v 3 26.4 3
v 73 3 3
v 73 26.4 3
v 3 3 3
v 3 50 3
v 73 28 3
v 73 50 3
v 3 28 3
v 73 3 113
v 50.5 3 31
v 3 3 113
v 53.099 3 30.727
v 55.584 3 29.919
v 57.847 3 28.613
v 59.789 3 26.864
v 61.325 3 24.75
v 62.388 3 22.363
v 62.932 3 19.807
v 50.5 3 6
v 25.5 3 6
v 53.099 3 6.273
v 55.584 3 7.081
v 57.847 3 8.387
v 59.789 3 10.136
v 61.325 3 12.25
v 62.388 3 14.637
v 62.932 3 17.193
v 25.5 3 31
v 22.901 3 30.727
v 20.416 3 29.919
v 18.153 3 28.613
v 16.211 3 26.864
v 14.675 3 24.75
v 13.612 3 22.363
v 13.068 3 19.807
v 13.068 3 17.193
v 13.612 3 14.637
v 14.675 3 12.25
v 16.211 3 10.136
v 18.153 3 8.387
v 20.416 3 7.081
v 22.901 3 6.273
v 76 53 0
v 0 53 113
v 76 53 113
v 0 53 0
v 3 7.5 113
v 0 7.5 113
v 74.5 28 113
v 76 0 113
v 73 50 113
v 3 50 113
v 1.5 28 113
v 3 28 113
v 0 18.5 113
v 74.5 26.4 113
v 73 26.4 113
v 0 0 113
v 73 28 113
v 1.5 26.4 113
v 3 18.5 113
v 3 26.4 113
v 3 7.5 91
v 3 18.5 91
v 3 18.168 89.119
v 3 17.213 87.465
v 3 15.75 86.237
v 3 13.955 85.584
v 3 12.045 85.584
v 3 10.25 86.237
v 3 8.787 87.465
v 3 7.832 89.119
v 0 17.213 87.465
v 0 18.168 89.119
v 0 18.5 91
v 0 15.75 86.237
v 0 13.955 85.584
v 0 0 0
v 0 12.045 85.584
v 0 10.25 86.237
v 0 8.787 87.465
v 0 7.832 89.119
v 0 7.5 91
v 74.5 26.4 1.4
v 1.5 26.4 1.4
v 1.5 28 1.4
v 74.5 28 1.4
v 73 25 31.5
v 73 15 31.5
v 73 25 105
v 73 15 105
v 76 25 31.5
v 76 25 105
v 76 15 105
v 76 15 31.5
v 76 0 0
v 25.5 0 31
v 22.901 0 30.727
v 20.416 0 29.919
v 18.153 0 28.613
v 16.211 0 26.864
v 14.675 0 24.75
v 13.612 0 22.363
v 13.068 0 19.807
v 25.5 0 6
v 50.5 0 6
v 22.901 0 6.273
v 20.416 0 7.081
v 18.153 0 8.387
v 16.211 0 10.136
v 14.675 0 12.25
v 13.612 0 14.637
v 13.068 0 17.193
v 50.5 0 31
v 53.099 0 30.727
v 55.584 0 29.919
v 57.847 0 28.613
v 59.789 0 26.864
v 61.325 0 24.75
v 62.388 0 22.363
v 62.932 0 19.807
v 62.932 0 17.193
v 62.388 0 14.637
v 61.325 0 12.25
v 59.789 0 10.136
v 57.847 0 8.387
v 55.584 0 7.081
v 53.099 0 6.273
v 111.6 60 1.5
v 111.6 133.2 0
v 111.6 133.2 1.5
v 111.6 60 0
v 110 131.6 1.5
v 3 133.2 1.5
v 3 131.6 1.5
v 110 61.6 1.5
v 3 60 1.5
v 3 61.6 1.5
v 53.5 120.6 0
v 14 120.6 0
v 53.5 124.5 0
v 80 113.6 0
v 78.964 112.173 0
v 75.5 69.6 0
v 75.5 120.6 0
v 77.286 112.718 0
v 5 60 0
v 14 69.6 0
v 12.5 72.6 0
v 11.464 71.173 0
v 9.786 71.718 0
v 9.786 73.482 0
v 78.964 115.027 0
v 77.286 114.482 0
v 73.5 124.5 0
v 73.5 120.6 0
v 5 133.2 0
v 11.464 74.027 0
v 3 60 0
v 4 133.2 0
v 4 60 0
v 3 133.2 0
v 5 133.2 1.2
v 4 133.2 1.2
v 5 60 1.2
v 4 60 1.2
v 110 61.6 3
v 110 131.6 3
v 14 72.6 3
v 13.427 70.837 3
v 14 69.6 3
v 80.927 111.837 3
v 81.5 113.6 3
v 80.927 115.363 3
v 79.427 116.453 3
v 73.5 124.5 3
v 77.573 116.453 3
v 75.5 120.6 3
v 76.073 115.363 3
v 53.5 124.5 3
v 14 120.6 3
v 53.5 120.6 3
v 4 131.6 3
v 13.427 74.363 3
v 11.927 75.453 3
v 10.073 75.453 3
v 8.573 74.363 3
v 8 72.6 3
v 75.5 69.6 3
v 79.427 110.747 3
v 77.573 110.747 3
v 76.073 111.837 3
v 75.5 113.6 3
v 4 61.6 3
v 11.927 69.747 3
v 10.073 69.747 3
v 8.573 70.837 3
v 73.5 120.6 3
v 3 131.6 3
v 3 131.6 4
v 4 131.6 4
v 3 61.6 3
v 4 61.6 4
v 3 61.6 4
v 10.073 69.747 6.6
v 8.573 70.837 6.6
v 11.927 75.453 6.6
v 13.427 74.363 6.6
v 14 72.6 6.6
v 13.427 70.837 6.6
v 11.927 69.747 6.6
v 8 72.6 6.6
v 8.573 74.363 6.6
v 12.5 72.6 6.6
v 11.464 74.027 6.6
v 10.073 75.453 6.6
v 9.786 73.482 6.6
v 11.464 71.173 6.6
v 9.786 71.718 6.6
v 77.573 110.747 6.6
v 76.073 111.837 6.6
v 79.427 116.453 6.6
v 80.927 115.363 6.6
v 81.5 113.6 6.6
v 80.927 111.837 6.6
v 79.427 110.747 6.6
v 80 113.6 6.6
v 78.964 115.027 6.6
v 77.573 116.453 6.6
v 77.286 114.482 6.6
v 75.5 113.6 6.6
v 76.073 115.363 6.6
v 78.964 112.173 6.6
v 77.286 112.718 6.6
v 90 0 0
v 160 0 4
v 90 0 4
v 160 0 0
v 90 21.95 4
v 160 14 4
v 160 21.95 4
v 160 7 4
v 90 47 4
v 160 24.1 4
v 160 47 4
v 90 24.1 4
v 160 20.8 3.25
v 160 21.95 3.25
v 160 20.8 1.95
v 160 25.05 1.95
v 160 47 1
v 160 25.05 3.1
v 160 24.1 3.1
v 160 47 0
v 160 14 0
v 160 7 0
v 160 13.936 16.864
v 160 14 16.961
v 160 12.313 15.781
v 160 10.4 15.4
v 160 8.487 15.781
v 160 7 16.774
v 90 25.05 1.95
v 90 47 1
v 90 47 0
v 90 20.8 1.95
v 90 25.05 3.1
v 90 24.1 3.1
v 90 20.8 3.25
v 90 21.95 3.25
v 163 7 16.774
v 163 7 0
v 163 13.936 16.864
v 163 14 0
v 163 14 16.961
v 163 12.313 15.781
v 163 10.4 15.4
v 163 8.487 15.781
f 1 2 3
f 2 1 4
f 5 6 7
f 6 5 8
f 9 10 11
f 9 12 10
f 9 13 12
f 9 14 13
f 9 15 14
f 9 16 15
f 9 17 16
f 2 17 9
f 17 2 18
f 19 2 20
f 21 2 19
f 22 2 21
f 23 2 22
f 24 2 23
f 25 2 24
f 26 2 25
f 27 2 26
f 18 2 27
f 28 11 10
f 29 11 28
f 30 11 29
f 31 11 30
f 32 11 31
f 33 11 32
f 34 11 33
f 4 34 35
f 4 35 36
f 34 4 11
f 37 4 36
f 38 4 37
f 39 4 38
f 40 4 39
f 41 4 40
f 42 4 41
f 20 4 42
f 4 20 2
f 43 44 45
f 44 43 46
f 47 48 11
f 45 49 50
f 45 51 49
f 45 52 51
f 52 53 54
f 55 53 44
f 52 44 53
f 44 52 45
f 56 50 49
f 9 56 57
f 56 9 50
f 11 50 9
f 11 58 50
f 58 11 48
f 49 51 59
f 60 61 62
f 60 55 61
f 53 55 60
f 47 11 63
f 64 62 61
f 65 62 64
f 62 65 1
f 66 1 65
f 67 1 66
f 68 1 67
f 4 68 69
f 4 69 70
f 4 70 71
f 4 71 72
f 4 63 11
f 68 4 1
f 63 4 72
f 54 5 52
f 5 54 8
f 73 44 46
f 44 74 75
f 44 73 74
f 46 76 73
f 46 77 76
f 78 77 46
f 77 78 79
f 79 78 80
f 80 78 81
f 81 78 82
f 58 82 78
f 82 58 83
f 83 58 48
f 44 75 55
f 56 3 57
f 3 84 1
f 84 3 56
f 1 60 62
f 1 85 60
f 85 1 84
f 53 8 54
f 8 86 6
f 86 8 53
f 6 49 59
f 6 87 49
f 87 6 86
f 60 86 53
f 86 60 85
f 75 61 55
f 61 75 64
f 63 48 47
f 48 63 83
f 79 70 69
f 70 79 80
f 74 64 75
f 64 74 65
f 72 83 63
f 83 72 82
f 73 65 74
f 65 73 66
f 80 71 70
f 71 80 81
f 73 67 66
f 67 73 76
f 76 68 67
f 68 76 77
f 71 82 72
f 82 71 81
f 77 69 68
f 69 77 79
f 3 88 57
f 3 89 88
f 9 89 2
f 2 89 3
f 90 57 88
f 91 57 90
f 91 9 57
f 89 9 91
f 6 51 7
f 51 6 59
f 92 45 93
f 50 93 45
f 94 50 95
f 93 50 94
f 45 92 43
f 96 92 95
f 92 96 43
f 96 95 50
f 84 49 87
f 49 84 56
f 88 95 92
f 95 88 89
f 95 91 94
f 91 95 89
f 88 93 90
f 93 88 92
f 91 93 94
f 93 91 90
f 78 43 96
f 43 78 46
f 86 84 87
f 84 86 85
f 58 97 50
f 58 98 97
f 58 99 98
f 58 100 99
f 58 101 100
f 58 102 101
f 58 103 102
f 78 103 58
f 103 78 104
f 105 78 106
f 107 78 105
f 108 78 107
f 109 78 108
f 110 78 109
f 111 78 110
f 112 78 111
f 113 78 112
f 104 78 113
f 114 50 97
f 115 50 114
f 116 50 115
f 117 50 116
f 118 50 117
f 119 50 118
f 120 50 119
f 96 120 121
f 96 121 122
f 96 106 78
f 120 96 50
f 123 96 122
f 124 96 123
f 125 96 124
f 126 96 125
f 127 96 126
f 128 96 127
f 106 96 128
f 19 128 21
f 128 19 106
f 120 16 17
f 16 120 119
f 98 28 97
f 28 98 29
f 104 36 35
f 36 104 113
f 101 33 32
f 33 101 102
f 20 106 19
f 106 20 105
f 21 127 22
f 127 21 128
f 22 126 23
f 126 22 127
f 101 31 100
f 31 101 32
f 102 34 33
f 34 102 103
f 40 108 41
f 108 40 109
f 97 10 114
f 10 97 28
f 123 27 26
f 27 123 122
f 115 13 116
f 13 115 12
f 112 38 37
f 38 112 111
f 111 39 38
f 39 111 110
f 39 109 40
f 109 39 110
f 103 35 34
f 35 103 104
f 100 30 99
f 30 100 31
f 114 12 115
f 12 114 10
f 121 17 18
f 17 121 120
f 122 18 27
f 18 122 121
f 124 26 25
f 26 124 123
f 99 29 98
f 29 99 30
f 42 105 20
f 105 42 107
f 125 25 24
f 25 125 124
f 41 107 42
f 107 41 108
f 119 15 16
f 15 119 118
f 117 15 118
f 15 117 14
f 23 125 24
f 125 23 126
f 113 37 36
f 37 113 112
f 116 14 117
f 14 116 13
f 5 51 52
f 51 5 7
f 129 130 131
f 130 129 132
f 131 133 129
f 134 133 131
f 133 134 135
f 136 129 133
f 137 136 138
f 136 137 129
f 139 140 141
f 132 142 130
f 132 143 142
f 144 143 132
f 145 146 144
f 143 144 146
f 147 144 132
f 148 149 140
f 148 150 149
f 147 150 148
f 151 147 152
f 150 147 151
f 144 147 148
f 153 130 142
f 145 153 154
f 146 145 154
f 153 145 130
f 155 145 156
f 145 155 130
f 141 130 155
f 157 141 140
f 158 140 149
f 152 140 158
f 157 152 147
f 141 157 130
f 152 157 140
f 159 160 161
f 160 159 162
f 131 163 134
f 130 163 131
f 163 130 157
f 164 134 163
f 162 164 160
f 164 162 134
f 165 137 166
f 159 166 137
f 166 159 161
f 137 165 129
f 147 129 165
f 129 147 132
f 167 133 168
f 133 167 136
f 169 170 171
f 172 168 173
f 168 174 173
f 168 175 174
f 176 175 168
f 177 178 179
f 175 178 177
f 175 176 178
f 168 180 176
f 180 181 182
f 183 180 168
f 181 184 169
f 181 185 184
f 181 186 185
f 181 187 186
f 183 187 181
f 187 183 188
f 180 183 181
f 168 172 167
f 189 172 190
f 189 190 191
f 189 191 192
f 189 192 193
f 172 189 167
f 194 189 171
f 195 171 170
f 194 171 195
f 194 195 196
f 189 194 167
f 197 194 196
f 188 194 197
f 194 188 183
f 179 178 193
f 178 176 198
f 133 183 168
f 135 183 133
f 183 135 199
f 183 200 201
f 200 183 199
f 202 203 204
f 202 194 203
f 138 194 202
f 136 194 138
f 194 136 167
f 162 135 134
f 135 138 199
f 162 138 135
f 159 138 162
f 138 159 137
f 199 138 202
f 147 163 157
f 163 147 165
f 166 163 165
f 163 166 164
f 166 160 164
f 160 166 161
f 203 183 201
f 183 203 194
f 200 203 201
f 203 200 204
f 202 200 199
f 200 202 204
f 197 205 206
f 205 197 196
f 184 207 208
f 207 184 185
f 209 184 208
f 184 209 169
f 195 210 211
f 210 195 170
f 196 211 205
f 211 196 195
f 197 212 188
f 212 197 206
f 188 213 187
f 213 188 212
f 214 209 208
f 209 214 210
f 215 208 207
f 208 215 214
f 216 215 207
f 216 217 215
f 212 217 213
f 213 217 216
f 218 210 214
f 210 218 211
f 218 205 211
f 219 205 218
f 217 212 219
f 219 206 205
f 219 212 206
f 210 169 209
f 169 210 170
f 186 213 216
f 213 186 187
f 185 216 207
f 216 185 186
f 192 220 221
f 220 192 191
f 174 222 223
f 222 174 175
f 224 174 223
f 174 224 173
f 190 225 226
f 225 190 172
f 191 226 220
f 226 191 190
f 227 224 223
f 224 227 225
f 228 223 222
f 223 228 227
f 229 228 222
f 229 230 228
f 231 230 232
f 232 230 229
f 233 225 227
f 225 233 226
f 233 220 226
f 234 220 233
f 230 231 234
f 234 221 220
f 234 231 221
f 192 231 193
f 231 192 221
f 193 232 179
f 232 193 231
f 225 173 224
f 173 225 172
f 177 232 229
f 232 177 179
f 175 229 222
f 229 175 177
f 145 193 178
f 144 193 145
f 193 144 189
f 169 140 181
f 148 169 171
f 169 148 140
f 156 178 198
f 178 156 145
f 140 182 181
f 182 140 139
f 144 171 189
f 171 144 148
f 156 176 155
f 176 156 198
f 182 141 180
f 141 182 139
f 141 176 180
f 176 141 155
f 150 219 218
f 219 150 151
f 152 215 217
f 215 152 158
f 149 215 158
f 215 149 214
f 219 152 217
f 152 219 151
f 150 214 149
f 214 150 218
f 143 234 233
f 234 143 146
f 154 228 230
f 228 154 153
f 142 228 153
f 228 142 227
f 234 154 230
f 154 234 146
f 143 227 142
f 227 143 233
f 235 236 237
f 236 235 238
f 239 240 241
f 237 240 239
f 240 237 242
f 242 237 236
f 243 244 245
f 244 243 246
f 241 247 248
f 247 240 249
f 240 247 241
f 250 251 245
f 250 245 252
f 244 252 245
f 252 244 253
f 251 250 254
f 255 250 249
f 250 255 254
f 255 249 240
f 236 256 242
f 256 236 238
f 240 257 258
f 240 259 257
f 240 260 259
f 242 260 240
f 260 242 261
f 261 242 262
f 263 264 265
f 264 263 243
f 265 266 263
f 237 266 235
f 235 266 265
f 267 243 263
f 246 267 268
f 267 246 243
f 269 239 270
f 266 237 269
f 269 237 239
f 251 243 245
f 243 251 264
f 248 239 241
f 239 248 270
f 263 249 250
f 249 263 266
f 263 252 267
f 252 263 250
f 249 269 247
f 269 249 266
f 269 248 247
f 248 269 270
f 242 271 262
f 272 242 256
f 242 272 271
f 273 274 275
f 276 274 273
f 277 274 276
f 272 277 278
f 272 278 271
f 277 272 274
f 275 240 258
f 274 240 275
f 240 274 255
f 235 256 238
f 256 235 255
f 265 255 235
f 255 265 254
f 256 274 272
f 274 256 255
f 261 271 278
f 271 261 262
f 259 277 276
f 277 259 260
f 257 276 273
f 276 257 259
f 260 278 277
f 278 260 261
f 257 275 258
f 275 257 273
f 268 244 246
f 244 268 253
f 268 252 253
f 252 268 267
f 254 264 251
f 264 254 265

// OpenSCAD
//$fn = 300;
//$fn = 100;

// Box sizes
bX = 110;
bY = 70;
bZ = 50;
bT = 3;

// Knob
kT = 1.6; // knob-"thickness"
knobX = 20;

compartmentHeight = 25;
sensorWidth = 25;
sensorLength = 50;


// Waspmote sizes
wmL = 73.5;
wmW = 51;
wmH = 13;

// Waspmote sockets
wmSh = 5;
wmSr = 3;


module sidewall() {
   difference() { 
    cube([bX, bT, bZ]);
    translate([0, bT/2, compartmentHeight]) cube([bX, bT, kT]);
   }
}

module sidewallLeft() {
    r = 5.5;
    difference() {
        sidewall();
//        translate([r+9, 0, compartmentHeight+bT+wmSh+bT/2+3])
        // 8 = distance of the case front to the waspmote
        // 6 = distance of antenna center from the mainboard margin
        // 6 = distance of antenna center from the mainboard bottom
        translate([r+8+8.5, 0, compartmentHeight+bT+wmSh+7.5]){
            rotate([0, 90, 90]){
                translate([-5,0,-0.5])cube([11,8+8.5+r+1,bT+1]);
            translate([0.5,0,-0.1])cylinder(r=r, h=bT+1);};}; // +1 because of weird rendering error
    };
}


module sidewallRight() {
    r = 6;
    difference() {
        sidewall();
//        translate([8, 0, compartmentHeight+bT+wmSh])
        translate([8, 0, compartmentHeight+bT])
            cube([wmL, bT, 10]);
    };
}

module backwall() {
    difference() {
        cube([bT, bY+2*bT, bZ]);
        translate([0, bT/2, compartmentHeight])
            cube([kT, bY+bT, kT]);
    }
}

module ceiling(x, y, z) {
    difference() {
        cube([x+z, y+2*z, z]);
//        translate([x-sensorWidth/2-5, ((y+2*z)-sensorWidth)/2, 0])
        translate([x-(sensorWidth/2+3), ((y+2*z)-sensorWidth)/2, 0])
//        translate([8+wmL+(sensorWidth/2), ((y+2*z)-sensorWidth)/2, 0])
            ceilingHole();
    }
}

module ceilingHole() {
    hull() {
        cylinder(r=sensorWidth/2, h=bT);
        translate([0, sensorLength - sensorWidth, 0])
            cylinder(r=sensorWidth/2, h=bT);
    }
}

module bottom() {
    cube([bX, bY + 2*bT, bT]);
    
}

// Box
module box() {
    union() {
        // left sidewall
        sidewallLeft();
        // right sidewall
        translate([0, bY+2*bT, 0])
            mirror([0, 1, 0])
            sidewallRight();
        // backwall
        translate([bX, 0, 0]) backwall();
        
        bottom();
        translate([0, 0, bZ]) ceiling(bX, bY, bT);
    }
}

module compartment(x, y, z, k) {
    shiftX = 3;
    kx = x + k;
    ky = y + 2 * k;
    kz = z / 2;
    union() {
        difference() {
            union() {
                difference() {
                    difference(){
                        union() {
                        // main board
                            translate([0,0,0]) cube([kx,ky,kz]);
                            translate([0,k,0]) cube([x,y,z]);
                        };
                        //Cut-Off 
                        cube([shiftX ,ky, z]);
                    };
                    // rail downside
                    translate([shiftX + 1,0,0])cube([1,ky,1.2]);
                };
                //rail upside
                translate([shiftX + 0,k,z])cube([1,y,1]);
                
                // waspmote socket 1
                translate([wmSr+8, wmSr+k+8, kT])
                    cylinder(h=5, r=wmSr, center=false);
                // waspmote socket 2
                translate([-wmSr+8+wmL, -wmSr+k+8+wmW-4, kT])
                    cylinder(h=wmSh, r=wmSr, center=false);
            };
            // waspmote hole
            translate([bT*2+8, kT+8, 0])
                cube([wmL-(wmSr*2*2), wmW, wmH]);
            translate([8+wmL-(bT*2+20+2), wmW+9.5, 0])
                cube([20,4,z]);
            // waspmote socket hole 1
            translate([wmSr+8, wmSr+k+8, 0])
                cylinder(h=wmSh + kT, r=wmSr/2, center=false);
            // waspmote socket hole 2
            translate([-wmSr+8+wmL, -wmSr+k+8+wmW-4, 0])
                cylinder(h=wmSh + kT, r=wmSr/2, center=false);
        };
    };
}

module waspmote() {
    cube([wmL, wmW, wmH]);
}

module wm_socket() {
    difference() {
        cylinder(h=wmSh , r=wmSr, center=false);
        cylinder(h=wmSh, r=wmSr/2, center=false);
    }
}

module cover() {
    shortenX = 3;
    translate([shortenX,0,0])cube([bZ - shortenX, bY, 1]);
    translate([0,0,1]) {
        difference() {
            difference(){
                difference(){
                    cube([bZ,bY,bT]);
                    cube([shortenX,bY,bT]);
                };
                    translate([compartmentHeight-0.05,0,bT-2.05])cube([bT + 0.1,bY,2.1]);
                };
            //rail upside
            translate([compartmentHeight + bT ,0,bT-2.05])cube([1.2,bY,1.3]);
        };
        //rail downside
        translate([compartmentHeight-0.1,0,bT-0.9])cube([1,bY,0.9]);
        
        //SideCover
        rotate([270, 0, 00]) {
        translate([compartmentHeight+bT+wmSh+7.5,-21.5,bY]){
            difference(){
                translate([-4.5,0,0])cube([7,22.5,bT]);
                translate([-0.9,2.1,0])cylinder(r=5, h=bT);
            };
        };
    };
};
}

// For printing all at once
translate([0 , bZ+bT, bX+bT]) rotate([0, 90, -90]) box();
translate([0 , 60, 0]) compartment(bX, bY, bT, kT);
translate([90, 50, 0]) rotate([0,0,-90]) cover();

// For Printing without box
//translate([0 , 60, 0]) compartment(bX, bY, bT, kT);
//translate([0, 50, 0]) rotate([0,0,-90])cover();

// compartment and cover together
//translate([0 , 60, 0]) compartment(bX, bY, bT, kT);
//translate([0.95, 63.5,-20]) mirror([0,0,1])rotate([90,90,90]) cover();

// For printing separately
//translate([0 , bZ+bT, bX+bT]) rotate([0, 90, -90]) box();
//compartment(bX, bY, bT, kT);

// All put together
//box();
//translate([0 , bT/2, compartmentHeight]){ compartment(bX, bY, bT, kT);
//translate([0, 1.5,-20]) mirror([0,0,1])rotate([90,90,90]) cover();};
//translate([8, kT+8, kT+compartmentHeight+wmSh]) waspmote();
